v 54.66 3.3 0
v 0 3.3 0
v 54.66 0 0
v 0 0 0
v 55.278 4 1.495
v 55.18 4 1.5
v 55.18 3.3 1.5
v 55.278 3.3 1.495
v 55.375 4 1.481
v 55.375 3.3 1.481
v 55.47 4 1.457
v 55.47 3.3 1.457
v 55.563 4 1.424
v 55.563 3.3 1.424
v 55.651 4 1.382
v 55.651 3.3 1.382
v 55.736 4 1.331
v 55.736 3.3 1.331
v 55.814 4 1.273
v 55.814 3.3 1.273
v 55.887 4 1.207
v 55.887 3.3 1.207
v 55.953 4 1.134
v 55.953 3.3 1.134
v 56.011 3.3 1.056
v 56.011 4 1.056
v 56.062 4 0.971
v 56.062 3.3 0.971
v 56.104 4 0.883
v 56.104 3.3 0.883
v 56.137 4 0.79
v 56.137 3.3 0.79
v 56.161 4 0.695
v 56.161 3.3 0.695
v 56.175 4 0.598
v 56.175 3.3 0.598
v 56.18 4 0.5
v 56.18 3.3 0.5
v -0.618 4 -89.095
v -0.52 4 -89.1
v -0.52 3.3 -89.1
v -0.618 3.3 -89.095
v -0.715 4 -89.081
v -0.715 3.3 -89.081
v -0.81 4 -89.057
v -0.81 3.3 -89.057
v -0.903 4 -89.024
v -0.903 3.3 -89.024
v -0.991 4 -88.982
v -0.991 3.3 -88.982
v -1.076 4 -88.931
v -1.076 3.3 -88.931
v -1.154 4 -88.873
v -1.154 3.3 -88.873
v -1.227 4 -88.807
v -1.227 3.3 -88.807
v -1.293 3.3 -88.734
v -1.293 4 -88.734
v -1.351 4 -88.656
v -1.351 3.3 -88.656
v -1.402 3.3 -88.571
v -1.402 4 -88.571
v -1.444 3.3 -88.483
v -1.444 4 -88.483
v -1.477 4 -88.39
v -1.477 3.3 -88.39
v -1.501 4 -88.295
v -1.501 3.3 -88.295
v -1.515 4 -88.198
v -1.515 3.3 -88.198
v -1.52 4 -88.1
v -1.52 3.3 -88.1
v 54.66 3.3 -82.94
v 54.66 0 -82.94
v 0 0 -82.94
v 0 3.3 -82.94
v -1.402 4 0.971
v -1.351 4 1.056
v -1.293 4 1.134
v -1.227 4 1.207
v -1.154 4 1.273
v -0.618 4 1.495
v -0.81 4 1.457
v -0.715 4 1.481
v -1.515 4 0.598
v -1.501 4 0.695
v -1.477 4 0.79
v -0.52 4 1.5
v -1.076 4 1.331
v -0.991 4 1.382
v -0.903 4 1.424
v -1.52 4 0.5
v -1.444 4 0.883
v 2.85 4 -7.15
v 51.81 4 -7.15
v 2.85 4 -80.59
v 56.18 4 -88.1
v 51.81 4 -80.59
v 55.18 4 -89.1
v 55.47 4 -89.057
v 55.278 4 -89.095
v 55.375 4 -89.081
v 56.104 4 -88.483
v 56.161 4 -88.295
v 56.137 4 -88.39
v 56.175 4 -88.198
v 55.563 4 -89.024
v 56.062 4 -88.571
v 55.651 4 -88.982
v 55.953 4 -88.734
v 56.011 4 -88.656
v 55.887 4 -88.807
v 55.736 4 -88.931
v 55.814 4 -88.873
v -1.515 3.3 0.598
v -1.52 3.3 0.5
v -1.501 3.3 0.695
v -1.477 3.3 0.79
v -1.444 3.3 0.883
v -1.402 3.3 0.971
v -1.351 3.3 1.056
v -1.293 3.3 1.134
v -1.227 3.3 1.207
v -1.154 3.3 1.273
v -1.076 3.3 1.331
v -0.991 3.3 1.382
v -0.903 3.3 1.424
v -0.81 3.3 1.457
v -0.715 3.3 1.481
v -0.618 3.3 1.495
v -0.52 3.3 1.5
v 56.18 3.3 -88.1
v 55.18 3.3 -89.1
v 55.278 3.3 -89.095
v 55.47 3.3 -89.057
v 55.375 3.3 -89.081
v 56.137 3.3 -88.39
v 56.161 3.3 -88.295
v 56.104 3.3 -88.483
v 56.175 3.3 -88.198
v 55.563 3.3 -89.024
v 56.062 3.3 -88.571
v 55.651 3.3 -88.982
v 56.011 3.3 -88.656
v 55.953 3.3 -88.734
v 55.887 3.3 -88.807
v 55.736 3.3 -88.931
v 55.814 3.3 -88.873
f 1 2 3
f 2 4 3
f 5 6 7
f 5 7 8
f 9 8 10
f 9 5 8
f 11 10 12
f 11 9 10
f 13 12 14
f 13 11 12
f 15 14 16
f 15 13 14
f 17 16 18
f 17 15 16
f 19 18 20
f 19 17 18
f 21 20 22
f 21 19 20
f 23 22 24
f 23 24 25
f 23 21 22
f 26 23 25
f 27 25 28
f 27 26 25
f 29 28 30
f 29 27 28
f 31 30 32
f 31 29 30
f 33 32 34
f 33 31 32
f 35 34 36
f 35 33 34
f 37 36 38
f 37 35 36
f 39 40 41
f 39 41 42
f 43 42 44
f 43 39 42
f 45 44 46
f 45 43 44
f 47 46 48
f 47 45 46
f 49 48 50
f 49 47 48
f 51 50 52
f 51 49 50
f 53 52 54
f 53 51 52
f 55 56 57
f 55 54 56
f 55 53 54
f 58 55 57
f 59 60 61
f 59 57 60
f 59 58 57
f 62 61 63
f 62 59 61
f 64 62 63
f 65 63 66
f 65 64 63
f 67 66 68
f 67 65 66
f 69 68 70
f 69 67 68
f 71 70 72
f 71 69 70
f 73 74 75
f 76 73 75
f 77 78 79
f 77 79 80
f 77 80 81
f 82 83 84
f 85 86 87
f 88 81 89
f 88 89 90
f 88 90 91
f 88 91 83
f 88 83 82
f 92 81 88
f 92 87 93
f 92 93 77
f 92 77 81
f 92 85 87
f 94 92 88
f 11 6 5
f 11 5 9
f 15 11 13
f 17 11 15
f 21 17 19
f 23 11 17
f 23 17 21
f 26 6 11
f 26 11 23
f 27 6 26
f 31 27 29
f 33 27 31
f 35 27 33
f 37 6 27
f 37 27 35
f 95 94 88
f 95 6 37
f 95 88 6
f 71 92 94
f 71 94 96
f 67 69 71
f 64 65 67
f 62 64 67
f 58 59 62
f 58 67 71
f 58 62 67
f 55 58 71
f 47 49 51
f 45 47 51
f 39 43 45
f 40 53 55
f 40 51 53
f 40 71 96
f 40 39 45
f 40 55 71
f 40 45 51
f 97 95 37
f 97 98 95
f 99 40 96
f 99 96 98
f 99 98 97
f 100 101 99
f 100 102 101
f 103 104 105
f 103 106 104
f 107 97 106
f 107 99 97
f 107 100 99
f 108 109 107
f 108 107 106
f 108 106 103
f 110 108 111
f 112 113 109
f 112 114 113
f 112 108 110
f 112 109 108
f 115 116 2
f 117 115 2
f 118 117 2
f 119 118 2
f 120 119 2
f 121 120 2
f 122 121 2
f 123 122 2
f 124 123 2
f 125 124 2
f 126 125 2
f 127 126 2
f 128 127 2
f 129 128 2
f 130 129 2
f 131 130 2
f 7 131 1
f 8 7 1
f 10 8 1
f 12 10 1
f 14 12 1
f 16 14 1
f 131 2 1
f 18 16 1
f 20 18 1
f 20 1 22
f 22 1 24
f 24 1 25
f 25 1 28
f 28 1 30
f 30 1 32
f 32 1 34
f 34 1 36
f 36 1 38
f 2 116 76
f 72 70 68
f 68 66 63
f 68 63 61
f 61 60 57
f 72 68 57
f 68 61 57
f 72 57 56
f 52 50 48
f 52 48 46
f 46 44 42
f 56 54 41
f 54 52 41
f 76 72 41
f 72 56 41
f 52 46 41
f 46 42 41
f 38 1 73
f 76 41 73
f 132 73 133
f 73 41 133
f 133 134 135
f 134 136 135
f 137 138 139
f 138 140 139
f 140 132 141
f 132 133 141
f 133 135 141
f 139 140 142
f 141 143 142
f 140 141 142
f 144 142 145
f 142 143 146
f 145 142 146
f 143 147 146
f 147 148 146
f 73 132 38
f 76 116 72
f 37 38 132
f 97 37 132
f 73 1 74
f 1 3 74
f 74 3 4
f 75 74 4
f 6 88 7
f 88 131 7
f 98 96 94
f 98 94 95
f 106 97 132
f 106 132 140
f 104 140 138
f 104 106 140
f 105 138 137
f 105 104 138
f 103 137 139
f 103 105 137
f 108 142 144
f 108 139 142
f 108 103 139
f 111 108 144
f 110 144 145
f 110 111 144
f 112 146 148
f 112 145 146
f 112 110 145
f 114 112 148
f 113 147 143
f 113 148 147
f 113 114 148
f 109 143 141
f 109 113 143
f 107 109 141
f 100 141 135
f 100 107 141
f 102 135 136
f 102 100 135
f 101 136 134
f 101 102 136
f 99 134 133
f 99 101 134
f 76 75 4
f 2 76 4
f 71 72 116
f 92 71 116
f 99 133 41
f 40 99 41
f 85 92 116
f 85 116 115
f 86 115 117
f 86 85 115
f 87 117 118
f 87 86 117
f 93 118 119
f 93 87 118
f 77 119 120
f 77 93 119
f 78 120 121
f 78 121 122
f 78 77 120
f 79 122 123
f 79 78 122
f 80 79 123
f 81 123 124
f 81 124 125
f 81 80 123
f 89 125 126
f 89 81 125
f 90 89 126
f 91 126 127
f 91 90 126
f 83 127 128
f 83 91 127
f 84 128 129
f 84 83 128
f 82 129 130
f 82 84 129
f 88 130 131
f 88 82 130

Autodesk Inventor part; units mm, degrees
ref_plane "YZ Plane" through (0, 0, 0) normal (1, 0, 0) x (0, 1, 0)
ref_plane "XZ Plane" through (0, 0, 0) normal (0, 1, 0) x (-1, 0, 0)
ref_plane "XY Plane" through (0, 0, 0) normal (0, 0, 1) x (1, 0, 0)
sketch "Sketch1" plane through (0, 0, 0) normal (0, 1, 0) x (-1, 0, 0)
  line L0 (0, 0) -> (-54.66, 0)
  line L1 (-54.66, 0) -> (-54.66, -82.94)
  line L2 (-54.66, -82.94) -> (0, -82.94)
  line L3 (0, -82.94) -> (0, 0)
  dimension "d0" = 54.66
  dimension "d1" = 82.94
extrude "Extrusion1" add sketch "Sketch1" along normal blind 2.3
sketch "Sketch2" plane through (0, 2.3, 0) normal (0, 1, 0) x (1, 0, 0)
  point P0 (0, 0)
sketch "Sketch3" plane through (0, 2.3, 0) normal (0, 1, 0) x (1, 0, 0)
  line L0 (2.85, 7.15) -> (51.81, 7.15)
  line L1 (51.81, 7.15) -> (51.81, 80.59)
  line L2 (51.81, 80.59) -> (2.85, 80.59)
  line L3 (2.85, 80.59) -> (2.85, 7.15)
  line L4 (54.66, 82.94) -> (0, 82.94) projected
  line L5 (0, 82.94) -> (0, 0) projected
  line L6 (0, 0) -> (54.66, 0)
  line L7 (54.66, 0) -> (54.66, 82.94)
  line L8 (54.66, 82.94) -> (0, 82.94)
  line L9 (0, 82.94) -> (0, 0)
  dimension "d4" = 73.44
  dimension "d5" = 48.96
  dimension "d6" = 2.35
  dimension "d7" = 2.85
extrude "Extrusion2" add sketch "Sketch3" along normal blind 1
sketch "Sketch4" plane through (0, 3.3, 0) normal (0, 1, 0) x (1, 0, 0)
  line L0 (-1.52, -1.5) -> (56.18, -1.5)
  line L1 (56.18, -1.5) -> (56.18, 89.1)
  line L2 (56.18, 89.1) -> (-1.52, 89.1)
  line L3 (-1.52, 89.1) -> (-1.52, -1.5)
  line L4 (0, 0) -> (54.66, 0) projected
  line L5 (54.66, 82.94) -> (0, 82.94) projected
  line L6 (2.85, 7.15) -> (51.81, 7.15) projected
  line L7 (51.81, 80.59) -> (2.85, 80.59) projected
  line L8 (51.81, 7.15) -> (2.85, 7.15)
  line L9 (2.85, 7.15) -> (2.85, 80.59)
  line L10 (2.85, 80.59) -> (51.81, 80.59)
  line L11 (51.81, 80.59) -> (51.81, 7.15)
  point P0 (27.33, 82.94)
  point P1 (27.33, 89.1)
  dimension "d10" = 90.6
  dimension "d11" = 57.7
  dimension "d12" = 1.5
extrude "Extrusion3" add sketch "Sketch4" along normal blind 0.7
fillet "Fillet1" radius 1 4 edges at (-1.52, 3.65, 1.5) (56.18, 3.65, 1.5) (56.18, 3.65, -89.1) (-1.52, 3.65, -89.1)
sketch "Sketch5" plane through (0, 2.3, 0) normal (0, 1, 0) x (1, 0, 0)
  line L0 (51.81, 7.15) -> (2.85, 7.15) projected
  line L1 (2.85, 80.59) -> (51.81, 80.59) projected
  line L2 (2.85, 7.15) -> (51.81, 7.15)
  line L3 (51.81, 7.15) -> (51.81, 80.59)
  line L4 (51.81, 80.59) -> (2.85, 80.59)
  line L5 (2.85, 80.59) -> (2.85, 7.15)
  point P0 (0, 0)
extrude "Extrusion4" add sketch "Sketch5" along normal blind 1.6999
properties part number "LCD+Cover"
